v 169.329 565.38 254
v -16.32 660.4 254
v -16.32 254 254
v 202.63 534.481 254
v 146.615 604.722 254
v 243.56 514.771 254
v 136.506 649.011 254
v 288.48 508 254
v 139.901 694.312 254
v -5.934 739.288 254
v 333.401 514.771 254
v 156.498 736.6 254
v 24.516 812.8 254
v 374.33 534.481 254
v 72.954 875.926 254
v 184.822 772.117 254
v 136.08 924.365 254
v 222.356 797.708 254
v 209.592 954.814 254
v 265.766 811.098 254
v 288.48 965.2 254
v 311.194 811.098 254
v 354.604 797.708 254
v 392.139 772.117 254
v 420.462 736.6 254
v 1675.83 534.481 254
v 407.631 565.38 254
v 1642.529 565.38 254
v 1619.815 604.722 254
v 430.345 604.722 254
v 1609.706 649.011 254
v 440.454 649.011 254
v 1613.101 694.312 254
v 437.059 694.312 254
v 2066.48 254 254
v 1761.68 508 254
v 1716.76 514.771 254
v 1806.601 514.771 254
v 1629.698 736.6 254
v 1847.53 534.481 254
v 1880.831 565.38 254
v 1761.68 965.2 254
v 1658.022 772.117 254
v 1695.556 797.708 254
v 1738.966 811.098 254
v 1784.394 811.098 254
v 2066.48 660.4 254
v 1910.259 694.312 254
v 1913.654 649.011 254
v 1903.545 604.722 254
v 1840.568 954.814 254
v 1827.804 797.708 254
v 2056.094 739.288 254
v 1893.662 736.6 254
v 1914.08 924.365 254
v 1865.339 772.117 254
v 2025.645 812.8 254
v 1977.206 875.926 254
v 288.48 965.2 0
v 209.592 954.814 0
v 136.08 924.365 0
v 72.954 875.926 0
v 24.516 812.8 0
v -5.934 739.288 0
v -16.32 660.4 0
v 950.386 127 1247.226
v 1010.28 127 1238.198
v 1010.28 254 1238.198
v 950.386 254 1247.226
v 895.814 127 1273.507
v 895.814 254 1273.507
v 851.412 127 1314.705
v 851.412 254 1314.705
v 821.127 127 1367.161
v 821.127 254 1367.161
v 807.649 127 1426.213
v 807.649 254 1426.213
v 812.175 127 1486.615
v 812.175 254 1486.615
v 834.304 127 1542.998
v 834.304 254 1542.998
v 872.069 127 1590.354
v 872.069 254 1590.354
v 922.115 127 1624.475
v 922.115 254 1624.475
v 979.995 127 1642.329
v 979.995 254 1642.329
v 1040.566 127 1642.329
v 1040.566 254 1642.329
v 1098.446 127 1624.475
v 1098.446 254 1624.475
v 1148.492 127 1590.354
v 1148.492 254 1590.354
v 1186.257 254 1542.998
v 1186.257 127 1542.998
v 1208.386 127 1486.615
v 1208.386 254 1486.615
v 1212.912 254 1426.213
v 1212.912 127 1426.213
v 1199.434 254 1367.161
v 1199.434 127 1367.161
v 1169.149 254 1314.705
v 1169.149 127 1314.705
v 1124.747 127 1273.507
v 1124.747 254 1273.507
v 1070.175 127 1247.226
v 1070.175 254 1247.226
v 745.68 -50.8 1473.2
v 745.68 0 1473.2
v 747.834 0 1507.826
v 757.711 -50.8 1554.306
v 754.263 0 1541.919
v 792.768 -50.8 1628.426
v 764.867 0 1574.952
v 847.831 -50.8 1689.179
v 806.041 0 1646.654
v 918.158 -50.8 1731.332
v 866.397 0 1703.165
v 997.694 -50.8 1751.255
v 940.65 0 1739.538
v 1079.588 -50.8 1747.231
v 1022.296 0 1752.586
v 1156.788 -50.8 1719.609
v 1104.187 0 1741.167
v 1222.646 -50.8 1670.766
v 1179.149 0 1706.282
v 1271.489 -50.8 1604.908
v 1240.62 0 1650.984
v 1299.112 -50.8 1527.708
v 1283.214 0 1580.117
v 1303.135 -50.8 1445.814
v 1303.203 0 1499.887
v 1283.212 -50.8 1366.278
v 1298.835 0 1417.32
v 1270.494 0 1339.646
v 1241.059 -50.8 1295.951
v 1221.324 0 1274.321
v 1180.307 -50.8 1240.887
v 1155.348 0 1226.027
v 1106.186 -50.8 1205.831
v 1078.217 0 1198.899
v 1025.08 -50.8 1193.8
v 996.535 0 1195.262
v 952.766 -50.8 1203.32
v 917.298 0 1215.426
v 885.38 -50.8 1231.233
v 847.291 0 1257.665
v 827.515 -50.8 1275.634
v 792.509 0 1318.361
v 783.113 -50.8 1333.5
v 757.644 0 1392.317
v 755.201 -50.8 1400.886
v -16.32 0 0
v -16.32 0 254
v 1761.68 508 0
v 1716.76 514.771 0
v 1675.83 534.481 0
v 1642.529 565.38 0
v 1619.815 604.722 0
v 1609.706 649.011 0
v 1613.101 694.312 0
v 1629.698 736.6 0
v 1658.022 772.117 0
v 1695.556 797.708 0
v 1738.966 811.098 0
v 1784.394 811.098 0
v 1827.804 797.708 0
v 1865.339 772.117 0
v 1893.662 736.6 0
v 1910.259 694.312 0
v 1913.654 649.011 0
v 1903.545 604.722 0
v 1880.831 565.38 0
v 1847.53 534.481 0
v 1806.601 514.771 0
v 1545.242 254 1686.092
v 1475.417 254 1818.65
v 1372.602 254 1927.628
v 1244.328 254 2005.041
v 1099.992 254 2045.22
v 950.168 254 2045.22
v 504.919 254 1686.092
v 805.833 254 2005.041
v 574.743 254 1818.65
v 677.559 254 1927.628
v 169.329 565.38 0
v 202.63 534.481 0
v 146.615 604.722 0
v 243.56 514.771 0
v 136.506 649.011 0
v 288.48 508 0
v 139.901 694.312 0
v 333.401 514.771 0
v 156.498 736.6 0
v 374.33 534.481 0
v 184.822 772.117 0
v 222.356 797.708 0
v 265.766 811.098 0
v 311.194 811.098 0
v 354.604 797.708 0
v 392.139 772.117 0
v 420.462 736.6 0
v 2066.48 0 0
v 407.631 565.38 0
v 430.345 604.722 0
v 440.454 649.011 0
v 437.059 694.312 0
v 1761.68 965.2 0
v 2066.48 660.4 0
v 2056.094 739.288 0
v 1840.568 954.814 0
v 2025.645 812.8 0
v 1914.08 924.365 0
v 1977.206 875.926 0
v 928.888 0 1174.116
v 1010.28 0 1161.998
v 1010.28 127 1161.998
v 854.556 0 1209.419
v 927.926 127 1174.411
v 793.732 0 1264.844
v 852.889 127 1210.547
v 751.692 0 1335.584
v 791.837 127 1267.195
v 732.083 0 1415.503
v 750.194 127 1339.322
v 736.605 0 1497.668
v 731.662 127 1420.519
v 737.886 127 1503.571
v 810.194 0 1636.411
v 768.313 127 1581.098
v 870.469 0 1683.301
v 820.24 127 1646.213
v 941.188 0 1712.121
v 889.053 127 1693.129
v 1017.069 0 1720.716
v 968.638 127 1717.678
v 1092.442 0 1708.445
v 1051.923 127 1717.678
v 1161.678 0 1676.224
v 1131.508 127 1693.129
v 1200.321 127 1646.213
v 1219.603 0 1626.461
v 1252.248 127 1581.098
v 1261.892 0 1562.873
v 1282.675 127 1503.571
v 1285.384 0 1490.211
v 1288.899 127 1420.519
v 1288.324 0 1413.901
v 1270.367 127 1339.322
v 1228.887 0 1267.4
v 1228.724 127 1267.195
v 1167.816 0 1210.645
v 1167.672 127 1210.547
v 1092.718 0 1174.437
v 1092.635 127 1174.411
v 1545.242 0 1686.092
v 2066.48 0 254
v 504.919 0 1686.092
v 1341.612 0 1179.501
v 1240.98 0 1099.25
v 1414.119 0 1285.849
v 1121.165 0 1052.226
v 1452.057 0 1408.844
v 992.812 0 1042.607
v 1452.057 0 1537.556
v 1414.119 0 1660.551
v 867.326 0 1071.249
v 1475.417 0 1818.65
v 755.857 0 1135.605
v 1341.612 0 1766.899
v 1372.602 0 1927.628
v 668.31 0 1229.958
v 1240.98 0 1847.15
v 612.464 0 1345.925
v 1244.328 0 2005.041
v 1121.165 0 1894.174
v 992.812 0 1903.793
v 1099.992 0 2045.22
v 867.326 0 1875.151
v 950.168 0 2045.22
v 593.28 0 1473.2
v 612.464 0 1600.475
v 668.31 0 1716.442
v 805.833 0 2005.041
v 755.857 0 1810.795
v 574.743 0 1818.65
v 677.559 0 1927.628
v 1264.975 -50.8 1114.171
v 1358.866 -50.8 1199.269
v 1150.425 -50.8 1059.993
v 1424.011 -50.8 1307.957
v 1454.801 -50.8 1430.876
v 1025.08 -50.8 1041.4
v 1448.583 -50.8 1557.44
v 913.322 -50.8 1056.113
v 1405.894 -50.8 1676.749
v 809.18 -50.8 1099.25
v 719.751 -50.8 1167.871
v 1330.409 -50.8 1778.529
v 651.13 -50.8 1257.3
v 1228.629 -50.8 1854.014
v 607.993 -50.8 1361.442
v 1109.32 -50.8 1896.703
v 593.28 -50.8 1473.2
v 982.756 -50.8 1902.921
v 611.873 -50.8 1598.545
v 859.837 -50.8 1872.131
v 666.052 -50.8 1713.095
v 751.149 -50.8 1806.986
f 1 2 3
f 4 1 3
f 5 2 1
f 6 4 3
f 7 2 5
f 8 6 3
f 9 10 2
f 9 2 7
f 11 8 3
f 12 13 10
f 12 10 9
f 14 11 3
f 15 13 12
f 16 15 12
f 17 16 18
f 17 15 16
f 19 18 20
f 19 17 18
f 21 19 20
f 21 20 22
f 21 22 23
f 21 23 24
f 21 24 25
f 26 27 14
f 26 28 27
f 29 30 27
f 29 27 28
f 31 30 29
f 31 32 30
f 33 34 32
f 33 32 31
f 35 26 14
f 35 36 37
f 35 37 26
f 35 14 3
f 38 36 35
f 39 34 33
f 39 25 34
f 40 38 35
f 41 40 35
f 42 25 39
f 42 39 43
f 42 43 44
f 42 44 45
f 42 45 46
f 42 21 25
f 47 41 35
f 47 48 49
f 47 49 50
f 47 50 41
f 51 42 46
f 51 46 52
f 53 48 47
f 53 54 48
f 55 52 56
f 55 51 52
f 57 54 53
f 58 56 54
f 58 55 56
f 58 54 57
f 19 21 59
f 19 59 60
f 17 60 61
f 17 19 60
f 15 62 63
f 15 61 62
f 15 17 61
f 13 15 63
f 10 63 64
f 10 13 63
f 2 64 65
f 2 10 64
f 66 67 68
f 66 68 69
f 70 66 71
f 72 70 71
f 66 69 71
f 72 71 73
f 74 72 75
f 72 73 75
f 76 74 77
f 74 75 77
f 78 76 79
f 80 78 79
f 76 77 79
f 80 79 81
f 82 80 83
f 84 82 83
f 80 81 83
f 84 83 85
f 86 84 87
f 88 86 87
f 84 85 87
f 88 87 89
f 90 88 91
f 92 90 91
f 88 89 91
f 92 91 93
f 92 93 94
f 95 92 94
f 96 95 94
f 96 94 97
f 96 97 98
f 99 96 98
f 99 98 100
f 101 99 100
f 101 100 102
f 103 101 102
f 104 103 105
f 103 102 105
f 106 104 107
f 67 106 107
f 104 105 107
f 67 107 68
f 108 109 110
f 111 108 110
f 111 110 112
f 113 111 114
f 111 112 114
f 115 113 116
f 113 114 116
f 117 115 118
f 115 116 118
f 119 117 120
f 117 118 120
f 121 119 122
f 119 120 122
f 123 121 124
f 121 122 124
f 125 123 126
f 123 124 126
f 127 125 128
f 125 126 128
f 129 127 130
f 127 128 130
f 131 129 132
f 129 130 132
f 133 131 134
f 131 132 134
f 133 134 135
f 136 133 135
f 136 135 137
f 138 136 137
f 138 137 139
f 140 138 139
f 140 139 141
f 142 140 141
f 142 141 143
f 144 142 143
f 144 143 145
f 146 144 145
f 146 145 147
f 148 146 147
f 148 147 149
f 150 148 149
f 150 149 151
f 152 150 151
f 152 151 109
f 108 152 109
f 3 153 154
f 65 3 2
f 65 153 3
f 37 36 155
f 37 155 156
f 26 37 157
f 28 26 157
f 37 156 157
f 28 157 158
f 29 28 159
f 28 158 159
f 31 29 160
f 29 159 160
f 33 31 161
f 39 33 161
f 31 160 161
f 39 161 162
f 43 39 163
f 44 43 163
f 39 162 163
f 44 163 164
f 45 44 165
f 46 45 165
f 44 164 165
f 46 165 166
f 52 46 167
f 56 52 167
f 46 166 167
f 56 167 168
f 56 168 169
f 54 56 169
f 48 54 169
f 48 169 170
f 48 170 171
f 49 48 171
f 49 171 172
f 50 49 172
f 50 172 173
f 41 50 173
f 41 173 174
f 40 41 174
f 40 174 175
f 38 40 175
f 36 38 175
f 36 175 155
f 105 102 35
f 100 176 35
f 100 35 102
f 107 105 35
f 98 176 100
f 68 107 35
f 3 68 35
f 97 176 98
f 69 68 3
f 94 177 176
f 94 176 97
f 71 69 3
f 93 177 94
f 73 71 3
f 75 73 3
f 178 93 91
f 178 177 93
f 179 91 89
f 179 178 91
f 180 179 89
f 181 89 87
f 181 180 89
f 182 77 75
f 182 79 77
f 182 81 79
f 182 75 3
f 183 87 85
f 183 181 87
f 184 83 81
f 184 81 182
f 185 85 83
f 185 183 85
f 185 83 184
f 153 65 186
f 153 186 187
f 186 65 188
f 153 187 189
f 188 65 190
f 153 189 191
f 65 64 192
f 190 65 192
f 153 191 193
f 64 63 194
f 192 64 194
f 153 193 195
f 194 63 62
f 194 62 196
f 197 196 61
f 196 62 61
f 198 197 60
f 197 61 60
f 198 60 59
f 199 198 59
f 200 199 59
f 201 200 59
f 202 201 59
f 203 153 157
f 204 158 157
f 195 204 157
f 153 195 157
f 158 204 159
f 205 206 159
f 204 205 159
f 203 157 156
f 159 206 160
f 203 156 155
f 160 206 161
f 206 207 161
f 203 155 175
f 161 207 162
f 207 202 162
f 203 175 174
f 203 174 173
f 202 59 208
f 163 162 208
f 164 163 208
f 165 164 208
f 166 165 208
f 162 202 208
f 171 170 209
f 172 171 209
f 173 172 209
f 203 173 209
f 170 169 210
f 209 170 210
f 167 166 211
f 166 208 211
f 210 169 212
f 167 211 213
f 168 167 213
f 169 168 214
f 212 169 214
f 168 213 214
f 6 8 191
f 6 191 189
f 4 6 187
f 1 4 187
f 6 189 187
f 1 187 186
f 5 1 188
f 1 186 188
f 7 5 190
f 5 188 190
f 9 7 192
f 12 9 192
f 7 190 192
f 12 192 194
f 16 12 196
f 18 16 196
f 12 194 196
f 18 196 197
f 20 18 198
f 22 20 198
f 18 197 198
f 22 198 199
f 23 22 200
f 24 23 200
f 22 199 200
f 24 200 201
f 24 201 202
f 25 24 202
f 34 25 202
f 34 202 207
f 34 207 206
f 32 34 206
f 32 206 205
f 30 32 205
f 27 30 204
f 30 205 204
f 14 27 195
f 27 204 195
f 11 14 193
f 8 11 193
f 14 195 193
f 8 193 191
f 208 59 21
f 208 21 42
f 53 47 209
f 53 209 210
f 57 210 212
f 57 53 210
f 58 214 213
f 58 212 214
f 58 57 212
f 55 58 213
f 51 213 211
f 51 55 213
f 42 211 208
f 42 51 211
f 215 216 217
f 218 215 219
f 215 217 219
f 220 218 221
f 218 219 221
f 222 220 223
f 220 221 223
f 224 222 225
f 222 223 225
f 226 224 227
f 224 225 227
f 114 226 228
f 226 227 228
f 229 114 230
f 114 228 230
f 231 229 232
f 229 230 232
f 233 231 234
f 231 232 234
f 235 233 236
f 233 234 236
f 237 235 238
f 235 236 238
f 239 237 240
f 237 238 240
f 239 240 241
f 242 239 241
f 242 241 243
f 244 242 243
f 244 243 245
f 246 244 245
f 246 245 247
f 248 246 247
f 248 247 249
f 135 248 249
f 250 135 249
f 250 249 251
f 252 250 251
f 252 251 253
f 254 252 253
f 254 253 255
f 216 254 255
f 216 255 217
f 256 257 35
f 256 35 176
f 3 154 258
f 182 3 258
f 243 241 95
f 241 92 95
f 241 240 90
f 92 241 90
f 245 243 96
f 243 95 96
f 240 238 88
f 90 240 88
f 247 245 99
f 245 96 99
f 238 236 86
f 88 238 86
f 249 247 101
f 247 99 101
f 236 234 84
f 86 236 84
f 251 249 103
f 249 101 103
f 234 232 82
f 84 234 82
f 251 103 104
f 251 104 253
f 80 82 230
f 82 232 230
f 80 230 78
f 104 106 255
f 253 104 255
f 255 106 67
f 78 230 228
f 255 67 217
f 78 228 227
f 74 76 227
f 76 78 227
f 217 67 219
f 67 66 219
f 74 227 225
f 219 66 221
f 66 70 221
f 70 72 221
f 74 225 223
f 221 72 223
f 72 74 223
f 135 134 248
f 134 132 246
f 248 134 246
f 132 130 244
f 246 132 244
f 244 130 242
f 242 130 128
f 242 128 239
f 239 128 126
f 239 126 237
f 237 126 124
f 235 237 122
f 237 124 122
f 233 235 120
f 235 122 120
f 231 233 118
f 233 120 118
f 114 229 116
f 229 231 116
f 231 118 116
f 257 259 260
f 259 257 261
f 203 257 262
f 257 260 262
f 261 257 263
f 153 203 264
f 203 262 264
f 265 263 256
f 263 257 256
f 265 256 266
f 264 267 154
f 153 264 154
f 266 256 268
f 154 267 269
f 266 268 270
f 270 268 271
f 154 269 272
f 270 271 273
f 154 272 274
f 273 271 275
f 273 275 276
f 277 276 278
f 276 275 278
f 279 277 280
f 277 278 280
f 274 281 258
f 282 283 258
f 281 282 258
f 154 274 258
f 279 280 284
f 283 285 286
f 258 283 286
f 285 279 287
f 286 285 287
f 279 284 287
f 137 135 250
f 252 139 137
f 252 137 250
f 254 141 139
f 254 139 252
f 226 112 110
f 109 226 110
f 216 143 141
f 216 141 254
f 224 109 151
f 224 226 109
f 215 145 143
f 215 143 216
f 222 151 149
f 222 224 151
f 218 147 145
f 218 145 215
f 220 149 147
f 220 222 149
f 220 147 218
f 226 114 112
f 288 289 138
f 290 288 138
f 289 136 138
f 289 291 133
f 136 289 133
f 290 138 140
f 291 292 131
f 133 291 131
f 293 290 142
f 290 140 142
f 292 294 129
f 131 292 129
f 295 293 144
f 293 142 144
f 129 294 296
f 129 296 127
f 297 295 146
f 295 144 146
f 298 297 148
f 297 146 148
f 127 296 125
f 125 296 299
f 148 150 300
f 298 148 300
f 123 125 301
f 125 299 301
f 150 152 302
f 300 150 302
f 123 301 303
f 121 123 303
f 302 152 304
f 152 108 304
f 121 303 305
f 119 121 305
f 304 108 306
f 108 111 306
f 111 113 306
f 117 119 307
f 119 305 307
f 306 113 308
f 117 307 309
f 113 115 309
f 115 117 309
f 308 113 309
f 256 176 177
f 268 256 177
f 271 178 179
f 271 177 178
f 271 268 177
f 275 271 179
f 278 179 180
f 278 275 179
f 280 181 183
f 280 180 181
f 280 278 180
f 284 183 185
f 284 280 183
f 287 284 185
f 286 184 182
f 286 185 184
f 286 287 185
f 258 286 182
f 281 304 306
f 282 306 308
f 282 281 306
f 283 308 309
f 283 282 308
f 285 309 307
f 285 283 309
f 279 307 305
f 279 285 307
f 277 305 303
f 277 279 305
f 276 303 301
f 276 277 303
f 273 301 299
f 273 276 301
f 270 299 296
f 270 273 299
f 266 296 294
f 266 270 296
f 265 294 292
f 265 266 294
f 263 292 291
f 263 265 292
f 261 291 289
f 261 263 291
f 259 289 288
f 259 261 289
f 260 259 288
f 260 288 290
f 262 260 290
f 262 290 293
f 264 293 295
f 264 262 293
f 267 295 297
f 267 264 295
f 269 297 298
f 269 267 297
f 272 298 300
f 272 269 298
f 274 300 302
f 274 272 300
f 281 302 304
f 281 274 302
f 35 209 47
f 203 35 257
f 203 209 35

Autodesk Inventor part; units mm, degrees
ref_plane "YZ Plane" through (0, 0, 0) normal (1, 0, 0) x (0, 1, 0)
ref_plane "XZ Plane" through (0, 0, 0) normal (0, 1, 0) x (-1, 0, 0)
ref_plane "XY Plane" through (0, 0, 0) normal (0, 0, 1) x (1, 0, 0)
sketch "Sketch1" plane through (0, 0, 0) normal (0, 0, 1) x (1, 0, 0)
  line L0 (-16.3198, 0) -> (-16.3198, 965.2)
  line L1 (-16.3198, 965.2) -> (2066.4802, 965.2)
  line L2 (2066.4802, 965.2) -> (2066.4802, 0)
  line L3 (2066.4802, 0) -> (0, 0)
  line L4 (2066.4802, 0) -> (-16.3198, 0)
  dimension "d0" = 965.2
  dimension "d1" = 2082.8
extrude "Extrusion1" add sketch "Sketch1" along normal blind 254
fillet "Fillet1" radius 304.8 2 edges at (-16.3198, 965.2, 127) (2066.4802, 965.2, 127)
sketch "Sketch2" plane through (0, 0, 254) normal (0, 0, 1) x (1, 0, 0)
  arc A0 (288.4802, 965.2) -> (-16.3198, 660.4) centre (288.4802, 660.4) ccw projected
  circle A1 centre (288.4802, 660.4) radius 152.4
  point P0 (0, 0)
  dimension "d5" = 304.8
hole "Hole1" at (288.4802, 660.4, 254) direction (0, 0, -1) diameter 304.8 end through all
sketch "Sketch3" plane through (0, 0, 254) normal (0, 0, 1) x (1, 0, 0)
  arc A0 (2066.4802, 660.4) -> (1761.6802, 965.2) centre (1761.6802, 660.4) ccw projected
  circle A1 centre (1761.6802, 660.4) radius 152.4
  point P0 (0, 0)
  dimension "d13" = 304.8
hole "Hole2" at (1761.6802, 660.4, 254) direction (0, 0, -1) diameter 304.8 end through all
sketch "Sketch4" plane through (0, 0, 0) normal (0, 1, 0) x (-1, 0, 0)
  line L0 (16.3198, 254) -> (-2066.4802, 254) projected
  line L1 (16.3198, 254) -> (-1025.0802, 254)
  line L2 (-1025.0802, 254) -> (-1025.0802, 1473.2)
  line L3 (16.3198, 254) -> (-504.9189, 1686.0916)
  line L4 (16.3198, 254) -> (1540.3198, 254) construction
  line L5 (-2066.4802, 254) -> (-1545.2415, 1686.0916)
  line L6 (-2066.4802, 254) -> (-542.4802, 254) construction
  arc A0 (-504.9189, 1686.0916) -> (-1545.2415, 1686.0916) centre (-1025.0802, 1496.7683) ccw
  point P0 (0, 0)
  dimension "d21" = 1219.2
  dimension "d22" = 1524
  dimension "d23" = 110
  dimension "d24" = 1524
  dimension "d25" = 70
extrude "Extrusion2" add sketch "Sketch4" along normal blind 254
sketch "Sketch5" plane through (0, 0, 0) normal (0, 0, -1) x (-1, 0, 0)
  point P0 (0, 0)
  point P1 (-179.0917, -175.9118)
  point P2 (-179.0917, -175.9118)
sketch "Sketch6" plane through (0, 0, 0) normal (0, 1, 0) x (-1, 0, 0)
  line L0 (-2066.4802, 0) -> (-2066.4802, 254) projected
  line L1 (-2066.4802, 0) -> (-1025.0802, 0)
  line L2 (-1609.2802, 0) -> (-1914.0802, 0) projected
  line L3 (-1025.0802, 0) -> (-1025.0802, 1473.2)
  circle A0 centre (-1025.0802, 1473.2) radius 203.2
  circle A1 centre (-1025.0802, 1473.2) radius 279.4
  circle A2 centre (-1025.0802, 1473.2) radius 431.8
  point P0 (0, 0)
  dimension "d28" = 1041.4
  dimension "d29" = 1473.2
  dimension "d30" = 406.4
  dimension "d31" = 558.8
  dimension "d32" = 863.6
extrude "Extrusion3" add sketch "Sketch6" against normal blind 50.8 contours A2
sketch "Sketch7" plane through (0, 0, 0) normal (0, 1, 0) x (-1, 0, 0)
  circle A0 centre (-1025.0802, 1473.2) radius 279.4 projected
  circle A1 centre (-1025.0802, 1473.2) radius 203.2
  point P0 (0, 0)
  point P1 (-1010.2805, 1441.3983)
  dimension "d35" = 406.4
hole "Hole3" at (1010.2805, 0, 1441.3983) direction (0, 1, 0) diameter 406.4 end through all counterbore diameter 558.8 counterbore depth 127
sketch "Sketch8" plane through (1025.0802, -50.8, 1473.2) normal (0, -1, 0) x (1, 0, 0)
  point P0 (-1025.0802, -1473.2)
properties part number "axle support"
